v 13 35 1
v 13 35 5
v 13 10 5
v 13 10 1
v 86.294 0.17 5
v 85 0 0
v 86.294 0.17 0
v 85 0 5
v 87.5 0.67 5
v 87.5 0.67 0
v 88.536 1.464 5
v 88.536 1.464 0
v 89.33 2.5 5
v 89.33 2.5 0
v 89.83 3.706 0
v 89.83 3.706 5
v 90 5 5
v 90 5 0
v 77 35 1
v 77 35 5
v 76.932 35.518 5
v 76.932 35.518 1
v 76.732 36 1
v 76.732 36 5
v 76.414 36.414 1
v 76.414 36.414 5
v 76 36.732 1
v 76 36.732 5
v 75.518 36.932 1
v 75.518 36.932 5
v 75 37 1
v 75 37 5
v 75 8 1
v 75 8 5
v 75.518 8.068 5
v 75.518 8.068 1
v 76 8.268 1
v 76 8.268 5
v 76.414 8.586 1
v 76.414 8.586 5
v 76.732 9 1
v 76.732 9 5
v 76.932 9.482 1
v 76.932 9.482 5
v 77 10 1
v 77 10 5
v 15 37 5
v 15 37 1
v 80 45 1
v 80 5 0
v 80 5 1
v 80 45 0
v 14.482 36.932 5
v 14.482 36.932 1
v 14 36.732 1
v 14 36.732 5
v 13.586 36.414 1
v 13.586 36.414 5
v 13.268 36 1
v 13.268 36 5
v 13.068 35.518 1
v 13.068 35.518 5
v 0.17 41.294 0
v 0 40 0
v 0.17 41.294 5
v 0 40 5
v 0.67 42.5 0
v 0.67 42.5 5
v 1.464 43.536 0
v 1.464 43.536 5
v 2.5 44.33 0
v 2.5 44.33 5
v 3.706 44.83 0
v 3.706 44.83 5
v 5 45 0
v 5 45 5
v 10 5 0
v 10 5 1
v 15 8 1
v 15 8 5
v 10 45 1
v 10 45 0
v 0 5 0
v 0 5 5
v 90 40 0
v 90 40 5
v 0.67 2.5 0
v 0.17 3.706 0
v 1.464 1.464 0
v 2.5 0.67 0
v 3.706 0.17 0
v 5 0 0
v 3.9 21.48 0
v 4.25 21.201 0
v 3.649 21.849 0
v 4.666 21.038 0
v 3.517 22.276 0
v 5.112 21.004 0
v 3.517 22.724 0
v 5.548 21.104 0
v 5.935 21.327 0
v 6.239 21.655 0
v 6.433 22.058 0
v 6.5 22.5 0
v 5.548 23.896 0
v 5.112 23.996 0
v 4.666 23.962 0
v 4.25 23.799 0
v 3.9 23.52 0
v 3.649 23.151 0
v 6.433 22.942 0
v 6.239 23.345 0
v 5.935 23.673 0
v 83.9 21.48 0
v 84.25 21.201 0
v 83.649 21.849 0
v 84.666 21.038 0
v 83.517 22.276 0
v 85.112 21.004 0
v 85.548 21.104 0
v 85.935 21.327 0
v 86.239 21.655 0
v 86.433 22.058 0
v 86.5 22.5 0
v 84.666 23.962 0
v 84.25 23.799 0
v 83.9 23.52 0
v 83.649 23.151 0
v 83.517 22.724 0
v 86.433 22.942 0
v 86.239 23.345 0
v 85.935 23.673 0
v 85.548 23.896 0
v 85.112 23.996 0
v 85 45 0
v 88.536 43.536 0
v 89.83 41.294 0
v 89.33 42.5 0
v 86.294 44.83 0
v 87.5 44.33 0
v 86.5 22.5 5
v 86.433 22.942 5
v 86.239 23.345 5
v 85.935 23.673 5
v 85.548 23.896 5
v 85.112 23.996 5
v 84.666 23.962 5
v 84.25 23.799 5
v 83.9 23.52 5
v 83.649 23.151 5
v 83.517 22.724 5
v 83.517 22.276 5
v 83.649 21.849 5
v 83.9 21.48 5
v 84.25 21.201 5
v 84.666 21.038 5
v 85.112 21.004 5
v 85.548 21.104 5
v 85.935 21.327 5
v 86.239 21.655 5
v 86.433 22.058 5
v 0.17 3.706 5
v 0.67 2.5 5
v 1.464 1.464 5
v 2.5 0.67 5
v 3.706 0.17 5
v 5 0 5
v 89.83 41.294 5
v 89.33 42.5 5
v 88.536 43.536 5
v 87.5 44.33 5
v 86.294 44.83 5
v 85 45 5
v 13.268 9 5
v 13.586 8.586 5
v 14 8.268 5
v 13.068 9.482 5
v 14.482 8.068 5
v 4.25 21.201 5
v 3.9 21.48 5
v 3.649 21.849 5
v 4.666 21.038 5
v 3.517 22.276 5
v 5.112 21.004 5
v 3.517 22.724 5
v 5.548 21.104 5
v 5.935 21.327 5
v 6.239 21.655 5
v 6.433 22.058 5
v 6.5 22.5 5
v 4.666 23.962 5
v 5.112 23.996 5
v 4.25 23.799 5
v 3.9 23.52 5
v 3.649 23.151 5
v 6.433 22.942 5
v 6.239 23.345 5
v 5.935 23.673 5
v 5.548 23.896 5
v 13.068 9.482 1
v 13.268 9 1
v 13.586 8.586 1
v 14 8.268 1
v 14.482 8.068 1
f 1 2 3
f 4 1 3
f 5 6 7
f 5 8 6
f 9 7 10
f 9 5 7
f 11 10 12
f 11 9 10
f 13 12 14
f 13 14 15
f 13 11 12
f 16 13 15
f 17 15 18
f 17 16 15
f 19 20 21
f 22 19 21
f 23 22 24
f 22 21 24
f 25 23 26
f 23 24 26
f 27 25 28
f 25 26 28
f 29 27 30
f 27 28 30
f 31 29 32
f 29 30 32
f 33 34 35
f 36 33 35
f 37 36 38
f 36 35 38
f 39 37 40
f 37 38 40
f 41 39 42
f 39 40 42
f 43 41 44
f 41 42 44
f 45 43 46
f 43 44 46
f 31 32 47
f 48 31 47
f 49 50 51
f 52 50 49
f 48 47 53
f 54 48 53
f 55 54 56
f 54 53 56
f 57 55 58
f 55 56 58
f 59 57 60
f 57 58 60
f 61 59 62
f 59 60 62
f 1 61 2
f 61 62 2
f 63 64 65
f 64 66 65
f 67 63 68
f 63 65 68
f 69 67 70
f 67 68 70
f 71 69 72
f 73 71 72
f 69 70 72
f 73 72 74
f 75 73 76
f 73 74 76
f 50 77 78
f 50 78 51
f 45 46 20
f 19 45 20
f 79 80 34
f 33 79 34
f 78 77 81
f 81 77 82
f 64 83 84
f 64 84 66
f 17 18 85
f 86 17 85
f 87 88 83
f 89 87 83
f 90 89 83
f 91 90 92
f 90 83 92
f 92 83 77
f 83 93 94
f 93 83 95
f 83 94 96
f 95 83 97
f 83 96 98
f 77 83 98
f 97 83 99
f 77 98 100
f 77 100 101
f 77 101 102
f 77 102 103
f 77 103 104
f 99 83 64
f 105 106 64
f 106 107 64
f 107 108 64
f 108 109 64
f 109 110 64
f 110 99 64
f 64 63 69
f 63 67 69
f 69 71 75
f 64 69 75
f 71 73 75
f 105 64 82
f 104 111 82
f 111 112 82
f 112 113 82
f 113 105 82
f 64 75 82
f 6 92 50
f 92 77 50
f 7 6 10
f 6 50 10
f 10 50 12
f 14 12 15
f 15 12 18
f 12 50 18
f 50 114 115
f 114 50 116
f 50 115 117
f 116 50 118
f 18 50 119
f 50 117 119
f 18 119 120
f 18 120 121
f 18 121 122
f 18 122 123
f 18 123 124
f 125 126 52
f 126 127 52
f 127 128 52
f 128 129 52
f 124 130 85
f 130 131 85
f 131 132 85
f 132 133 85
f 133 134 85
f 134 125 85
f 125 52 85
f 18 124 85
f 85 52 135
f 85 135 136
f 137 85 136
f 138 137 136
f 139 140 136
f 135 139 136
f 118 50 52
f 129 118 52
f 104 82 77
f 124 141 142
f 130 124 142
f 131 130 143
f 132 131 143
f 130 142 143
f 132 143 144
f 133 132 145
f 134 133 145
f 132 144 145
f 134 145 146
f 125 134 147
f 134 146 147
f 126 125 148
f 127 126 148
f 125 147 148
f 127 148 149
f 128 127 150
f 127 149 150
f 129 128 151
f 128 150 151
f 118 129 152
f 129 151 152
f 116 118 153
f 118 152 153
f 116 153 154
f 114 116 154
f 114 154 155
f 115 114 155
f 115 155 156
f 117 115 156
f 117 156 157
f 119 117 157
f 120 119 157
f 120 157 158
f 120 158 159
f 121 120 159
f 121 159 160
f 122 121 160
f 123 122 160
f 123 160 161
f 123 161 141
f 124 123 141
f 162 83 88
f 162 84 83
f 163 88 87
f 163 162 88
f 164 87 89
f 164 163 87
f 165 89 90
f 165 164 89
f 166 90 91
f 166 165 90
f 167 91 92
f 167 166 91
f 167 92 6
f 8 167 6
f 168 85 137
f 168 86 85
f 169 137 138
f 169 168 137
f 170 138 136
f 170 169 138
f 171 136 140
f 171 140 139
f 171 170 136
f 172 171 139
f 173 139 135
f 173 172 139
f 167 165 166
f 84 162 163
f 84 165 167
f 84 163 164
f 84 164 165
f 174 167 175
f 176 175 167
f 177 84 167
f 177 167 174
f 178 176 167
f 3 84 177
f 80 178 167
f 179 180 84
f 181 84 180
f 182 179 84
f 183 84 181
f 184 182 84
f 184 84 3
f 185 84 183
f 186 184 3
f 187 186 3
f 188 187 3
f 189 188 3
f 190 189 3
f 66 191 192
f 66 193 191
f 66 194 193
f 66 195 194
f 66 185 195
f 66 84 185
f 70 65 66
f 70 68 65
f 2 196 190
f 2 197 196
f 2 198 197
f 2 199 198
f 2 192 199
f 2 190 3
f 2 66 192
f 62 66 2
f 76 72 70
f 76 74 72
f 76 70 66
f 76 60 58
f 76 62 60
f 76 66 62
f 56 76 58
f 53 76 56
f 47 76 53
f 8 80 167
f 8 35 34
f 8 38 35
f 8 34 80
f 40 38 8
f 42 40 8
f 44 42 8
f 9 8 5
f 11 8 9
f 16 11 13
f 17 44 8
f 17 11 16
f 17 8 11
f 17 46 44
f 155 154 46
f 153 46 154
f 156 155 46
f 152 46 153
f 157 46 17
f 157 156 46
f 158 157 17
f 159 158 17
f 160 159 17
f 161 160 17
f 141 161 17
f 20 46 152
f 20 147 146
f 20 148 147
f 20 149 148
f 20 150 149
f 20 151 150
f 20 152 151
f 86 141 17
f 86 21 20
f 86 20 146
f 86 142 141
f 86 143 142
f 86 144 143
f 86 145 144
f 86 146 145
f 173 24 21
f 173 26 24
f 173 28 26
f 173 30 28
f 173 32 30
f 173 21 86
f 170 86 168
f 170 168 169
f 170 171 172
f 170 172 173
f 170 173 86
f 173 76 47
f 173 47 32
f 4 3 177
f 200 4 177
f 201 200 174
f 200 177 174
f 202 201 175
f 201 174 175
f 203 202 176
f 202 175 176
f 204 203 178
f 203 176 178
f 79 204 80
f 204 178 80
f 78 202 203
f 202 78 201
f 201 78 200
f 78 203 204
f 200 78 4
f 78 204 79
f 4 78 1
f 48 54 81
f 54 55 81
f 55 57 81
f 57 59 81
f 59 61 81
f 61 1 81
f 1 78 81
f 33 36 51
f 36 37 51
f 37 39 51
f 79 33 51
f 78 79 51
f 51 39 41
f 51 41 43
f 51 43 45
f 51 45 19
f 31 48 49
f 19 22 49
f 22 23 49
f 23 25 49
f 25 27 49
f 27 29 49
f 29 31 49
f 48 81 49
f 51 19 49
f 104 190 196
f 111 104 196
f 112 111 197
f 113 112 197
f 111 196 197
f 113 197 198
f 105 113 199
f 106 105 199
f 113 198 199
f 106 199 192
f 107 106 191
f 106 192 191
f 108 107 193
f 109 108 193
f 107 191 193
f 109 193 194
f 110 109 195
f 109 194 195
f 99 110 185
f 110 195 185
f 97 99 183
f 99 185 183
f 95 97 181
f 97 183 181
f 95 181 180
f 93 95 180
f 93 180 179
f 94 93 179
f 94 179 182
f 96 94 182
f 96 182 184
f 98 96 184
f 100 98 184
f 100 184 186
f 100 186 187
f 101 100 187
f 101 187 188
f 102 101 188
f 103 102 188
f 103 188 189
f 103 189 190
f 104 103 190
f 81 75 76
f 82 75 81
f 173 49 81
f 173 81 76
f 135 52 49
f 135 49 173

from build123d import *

# Parameters (mm, degrees)
F0_W     = 90
F0_H     = 45
F1_DEPTH = 5
F2_R     = 5
F3_W     = 70
F3_H     = 40
F4_DEPTH = 1
F6_DEPTH = 25
F7_R     = 1.5
F8_DEPTH = 25


with BuildPart() as f1:
    # F0 (on Top) → F1 (new body)
    with BuildSketch(Plane.XY):
        with Locations((45, 22.5)):
            Rectangle(F0_W, F0_H)
    extrude(amount=F1_DEPTH)

    # F2
    f2_edges = [f1.edges().sort_by_distance(p)[0] for p in [
        (90, 45, 2.5),
        (90, 0, 2.5),
        (0, 45, 2.5),
        (0, 0, 2.5),
    ]]
    fillet(f2_edges, radius=F2_R)

    # F3 (on Top) → F4 (cut)
    with BuildSketch(Plane.XY):
        with Locations((45, 25)):
            Rectangle(F3_W, F3_H)
    extrude(amount=F4_DEPTH, mode=Mode.SUBTRACT)

    # F5 (on face) → F6 (cut)
    with BuildSketch(Plane.XY.offset(5)):
        with BuildLine():
            Line((75, 37), (15, 37))
            ThreePointArc((15, 37), (13.585786, 36.414214), (13, 35))
            Line((13, 35), (13, 10))
            ThreePointArc((13, 10), (13.585786, 8.585786), (15, 8))
            Line((15, 8), (75, 8))
            ThreePointArc((75, 8), (76.414214, 8.585786), (77, 10))
            Line((77, 10), (77, 35))
            ThreePointArc((77, 35), (76.414214, 36.414214), (75, 37))
        make_face()
    extrude(amount=-F6_DEPTH, mode=Mode.SUBTRACT)

    # F7 (on face) → F8 (cut)
    with BuildSketch(Plane.XY.offset(5)):
        with Locations((5, 22.5)):
            Circle(F7_R)
        with Locations((85, 22.5)):
            Circle(F7_R)
    extrude(amount=-F8_DEPTH, mode=Mode.SUBTRACT)


solid = f1.part
